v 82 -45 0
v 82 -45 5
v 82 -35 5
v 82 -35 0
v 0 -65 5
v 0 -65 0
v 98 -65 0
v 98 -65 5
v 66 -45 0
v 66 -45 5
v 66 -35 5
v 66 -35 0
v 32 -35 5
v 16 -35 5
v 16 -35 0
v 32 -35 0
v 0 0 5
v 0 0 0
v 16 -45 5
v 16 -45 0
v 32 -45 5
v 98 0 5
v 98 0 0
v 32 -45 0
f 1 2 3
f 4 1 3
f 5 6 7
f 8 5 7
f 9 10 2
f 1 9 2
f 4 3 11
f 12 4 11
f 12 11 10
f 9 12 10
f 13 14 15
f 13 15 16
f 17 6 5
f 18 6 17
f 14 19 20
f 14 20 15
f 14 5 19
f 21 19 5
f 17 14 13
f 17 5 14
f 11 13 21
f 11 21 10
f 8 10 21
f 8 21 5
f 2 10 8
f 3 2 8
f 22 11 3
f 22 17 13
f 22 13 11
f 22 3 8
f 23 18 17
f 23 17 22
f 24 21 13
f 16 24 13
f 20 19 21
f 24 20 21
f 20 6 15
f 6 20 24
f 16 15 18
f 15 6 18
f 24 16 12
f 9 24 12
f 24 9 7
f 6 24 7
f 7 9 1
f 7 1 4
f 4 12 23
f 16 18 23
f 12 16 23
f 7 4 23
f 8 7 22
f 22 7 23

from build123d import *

# Parameters (mm, degrees)
SKETCH1_W           = 98
SKETCH1_H           = 65
BOSS_EXTRUDE1_DEPTH = 5
SKETCH2_W           = 16
SKETCH2_H           = 10
CUT_EXTRUDE1_DEPTH  = 15


with BuildPart() as part:
    # Sketch1 → Boss-Extrude1 (new body)
    with BuildSketch(Plane.XY):
        with Locations((49, -32.5)):
            Rectangle(SKETCH1_W, SKETCH1_H)
    extrude(amount=BOSS_EXTRUDE1_DEPTH)

    # Sketch2 → Cut-Extrude1 (cut)
    with BuildSketch(Plane.XY.offset(5)):
        Polygon((82, -45), (82, -40), (82, -35), (66, -35), (66, -45), align=None)
        with Locations((24, -40)):
            Rectangle(SKETCH2_W, SKETCH2_H)
    extrude(amount=-CUT_EXTRUDE1_DEPTH, mode=Mode.SUBTRACT)


solid = part.part
